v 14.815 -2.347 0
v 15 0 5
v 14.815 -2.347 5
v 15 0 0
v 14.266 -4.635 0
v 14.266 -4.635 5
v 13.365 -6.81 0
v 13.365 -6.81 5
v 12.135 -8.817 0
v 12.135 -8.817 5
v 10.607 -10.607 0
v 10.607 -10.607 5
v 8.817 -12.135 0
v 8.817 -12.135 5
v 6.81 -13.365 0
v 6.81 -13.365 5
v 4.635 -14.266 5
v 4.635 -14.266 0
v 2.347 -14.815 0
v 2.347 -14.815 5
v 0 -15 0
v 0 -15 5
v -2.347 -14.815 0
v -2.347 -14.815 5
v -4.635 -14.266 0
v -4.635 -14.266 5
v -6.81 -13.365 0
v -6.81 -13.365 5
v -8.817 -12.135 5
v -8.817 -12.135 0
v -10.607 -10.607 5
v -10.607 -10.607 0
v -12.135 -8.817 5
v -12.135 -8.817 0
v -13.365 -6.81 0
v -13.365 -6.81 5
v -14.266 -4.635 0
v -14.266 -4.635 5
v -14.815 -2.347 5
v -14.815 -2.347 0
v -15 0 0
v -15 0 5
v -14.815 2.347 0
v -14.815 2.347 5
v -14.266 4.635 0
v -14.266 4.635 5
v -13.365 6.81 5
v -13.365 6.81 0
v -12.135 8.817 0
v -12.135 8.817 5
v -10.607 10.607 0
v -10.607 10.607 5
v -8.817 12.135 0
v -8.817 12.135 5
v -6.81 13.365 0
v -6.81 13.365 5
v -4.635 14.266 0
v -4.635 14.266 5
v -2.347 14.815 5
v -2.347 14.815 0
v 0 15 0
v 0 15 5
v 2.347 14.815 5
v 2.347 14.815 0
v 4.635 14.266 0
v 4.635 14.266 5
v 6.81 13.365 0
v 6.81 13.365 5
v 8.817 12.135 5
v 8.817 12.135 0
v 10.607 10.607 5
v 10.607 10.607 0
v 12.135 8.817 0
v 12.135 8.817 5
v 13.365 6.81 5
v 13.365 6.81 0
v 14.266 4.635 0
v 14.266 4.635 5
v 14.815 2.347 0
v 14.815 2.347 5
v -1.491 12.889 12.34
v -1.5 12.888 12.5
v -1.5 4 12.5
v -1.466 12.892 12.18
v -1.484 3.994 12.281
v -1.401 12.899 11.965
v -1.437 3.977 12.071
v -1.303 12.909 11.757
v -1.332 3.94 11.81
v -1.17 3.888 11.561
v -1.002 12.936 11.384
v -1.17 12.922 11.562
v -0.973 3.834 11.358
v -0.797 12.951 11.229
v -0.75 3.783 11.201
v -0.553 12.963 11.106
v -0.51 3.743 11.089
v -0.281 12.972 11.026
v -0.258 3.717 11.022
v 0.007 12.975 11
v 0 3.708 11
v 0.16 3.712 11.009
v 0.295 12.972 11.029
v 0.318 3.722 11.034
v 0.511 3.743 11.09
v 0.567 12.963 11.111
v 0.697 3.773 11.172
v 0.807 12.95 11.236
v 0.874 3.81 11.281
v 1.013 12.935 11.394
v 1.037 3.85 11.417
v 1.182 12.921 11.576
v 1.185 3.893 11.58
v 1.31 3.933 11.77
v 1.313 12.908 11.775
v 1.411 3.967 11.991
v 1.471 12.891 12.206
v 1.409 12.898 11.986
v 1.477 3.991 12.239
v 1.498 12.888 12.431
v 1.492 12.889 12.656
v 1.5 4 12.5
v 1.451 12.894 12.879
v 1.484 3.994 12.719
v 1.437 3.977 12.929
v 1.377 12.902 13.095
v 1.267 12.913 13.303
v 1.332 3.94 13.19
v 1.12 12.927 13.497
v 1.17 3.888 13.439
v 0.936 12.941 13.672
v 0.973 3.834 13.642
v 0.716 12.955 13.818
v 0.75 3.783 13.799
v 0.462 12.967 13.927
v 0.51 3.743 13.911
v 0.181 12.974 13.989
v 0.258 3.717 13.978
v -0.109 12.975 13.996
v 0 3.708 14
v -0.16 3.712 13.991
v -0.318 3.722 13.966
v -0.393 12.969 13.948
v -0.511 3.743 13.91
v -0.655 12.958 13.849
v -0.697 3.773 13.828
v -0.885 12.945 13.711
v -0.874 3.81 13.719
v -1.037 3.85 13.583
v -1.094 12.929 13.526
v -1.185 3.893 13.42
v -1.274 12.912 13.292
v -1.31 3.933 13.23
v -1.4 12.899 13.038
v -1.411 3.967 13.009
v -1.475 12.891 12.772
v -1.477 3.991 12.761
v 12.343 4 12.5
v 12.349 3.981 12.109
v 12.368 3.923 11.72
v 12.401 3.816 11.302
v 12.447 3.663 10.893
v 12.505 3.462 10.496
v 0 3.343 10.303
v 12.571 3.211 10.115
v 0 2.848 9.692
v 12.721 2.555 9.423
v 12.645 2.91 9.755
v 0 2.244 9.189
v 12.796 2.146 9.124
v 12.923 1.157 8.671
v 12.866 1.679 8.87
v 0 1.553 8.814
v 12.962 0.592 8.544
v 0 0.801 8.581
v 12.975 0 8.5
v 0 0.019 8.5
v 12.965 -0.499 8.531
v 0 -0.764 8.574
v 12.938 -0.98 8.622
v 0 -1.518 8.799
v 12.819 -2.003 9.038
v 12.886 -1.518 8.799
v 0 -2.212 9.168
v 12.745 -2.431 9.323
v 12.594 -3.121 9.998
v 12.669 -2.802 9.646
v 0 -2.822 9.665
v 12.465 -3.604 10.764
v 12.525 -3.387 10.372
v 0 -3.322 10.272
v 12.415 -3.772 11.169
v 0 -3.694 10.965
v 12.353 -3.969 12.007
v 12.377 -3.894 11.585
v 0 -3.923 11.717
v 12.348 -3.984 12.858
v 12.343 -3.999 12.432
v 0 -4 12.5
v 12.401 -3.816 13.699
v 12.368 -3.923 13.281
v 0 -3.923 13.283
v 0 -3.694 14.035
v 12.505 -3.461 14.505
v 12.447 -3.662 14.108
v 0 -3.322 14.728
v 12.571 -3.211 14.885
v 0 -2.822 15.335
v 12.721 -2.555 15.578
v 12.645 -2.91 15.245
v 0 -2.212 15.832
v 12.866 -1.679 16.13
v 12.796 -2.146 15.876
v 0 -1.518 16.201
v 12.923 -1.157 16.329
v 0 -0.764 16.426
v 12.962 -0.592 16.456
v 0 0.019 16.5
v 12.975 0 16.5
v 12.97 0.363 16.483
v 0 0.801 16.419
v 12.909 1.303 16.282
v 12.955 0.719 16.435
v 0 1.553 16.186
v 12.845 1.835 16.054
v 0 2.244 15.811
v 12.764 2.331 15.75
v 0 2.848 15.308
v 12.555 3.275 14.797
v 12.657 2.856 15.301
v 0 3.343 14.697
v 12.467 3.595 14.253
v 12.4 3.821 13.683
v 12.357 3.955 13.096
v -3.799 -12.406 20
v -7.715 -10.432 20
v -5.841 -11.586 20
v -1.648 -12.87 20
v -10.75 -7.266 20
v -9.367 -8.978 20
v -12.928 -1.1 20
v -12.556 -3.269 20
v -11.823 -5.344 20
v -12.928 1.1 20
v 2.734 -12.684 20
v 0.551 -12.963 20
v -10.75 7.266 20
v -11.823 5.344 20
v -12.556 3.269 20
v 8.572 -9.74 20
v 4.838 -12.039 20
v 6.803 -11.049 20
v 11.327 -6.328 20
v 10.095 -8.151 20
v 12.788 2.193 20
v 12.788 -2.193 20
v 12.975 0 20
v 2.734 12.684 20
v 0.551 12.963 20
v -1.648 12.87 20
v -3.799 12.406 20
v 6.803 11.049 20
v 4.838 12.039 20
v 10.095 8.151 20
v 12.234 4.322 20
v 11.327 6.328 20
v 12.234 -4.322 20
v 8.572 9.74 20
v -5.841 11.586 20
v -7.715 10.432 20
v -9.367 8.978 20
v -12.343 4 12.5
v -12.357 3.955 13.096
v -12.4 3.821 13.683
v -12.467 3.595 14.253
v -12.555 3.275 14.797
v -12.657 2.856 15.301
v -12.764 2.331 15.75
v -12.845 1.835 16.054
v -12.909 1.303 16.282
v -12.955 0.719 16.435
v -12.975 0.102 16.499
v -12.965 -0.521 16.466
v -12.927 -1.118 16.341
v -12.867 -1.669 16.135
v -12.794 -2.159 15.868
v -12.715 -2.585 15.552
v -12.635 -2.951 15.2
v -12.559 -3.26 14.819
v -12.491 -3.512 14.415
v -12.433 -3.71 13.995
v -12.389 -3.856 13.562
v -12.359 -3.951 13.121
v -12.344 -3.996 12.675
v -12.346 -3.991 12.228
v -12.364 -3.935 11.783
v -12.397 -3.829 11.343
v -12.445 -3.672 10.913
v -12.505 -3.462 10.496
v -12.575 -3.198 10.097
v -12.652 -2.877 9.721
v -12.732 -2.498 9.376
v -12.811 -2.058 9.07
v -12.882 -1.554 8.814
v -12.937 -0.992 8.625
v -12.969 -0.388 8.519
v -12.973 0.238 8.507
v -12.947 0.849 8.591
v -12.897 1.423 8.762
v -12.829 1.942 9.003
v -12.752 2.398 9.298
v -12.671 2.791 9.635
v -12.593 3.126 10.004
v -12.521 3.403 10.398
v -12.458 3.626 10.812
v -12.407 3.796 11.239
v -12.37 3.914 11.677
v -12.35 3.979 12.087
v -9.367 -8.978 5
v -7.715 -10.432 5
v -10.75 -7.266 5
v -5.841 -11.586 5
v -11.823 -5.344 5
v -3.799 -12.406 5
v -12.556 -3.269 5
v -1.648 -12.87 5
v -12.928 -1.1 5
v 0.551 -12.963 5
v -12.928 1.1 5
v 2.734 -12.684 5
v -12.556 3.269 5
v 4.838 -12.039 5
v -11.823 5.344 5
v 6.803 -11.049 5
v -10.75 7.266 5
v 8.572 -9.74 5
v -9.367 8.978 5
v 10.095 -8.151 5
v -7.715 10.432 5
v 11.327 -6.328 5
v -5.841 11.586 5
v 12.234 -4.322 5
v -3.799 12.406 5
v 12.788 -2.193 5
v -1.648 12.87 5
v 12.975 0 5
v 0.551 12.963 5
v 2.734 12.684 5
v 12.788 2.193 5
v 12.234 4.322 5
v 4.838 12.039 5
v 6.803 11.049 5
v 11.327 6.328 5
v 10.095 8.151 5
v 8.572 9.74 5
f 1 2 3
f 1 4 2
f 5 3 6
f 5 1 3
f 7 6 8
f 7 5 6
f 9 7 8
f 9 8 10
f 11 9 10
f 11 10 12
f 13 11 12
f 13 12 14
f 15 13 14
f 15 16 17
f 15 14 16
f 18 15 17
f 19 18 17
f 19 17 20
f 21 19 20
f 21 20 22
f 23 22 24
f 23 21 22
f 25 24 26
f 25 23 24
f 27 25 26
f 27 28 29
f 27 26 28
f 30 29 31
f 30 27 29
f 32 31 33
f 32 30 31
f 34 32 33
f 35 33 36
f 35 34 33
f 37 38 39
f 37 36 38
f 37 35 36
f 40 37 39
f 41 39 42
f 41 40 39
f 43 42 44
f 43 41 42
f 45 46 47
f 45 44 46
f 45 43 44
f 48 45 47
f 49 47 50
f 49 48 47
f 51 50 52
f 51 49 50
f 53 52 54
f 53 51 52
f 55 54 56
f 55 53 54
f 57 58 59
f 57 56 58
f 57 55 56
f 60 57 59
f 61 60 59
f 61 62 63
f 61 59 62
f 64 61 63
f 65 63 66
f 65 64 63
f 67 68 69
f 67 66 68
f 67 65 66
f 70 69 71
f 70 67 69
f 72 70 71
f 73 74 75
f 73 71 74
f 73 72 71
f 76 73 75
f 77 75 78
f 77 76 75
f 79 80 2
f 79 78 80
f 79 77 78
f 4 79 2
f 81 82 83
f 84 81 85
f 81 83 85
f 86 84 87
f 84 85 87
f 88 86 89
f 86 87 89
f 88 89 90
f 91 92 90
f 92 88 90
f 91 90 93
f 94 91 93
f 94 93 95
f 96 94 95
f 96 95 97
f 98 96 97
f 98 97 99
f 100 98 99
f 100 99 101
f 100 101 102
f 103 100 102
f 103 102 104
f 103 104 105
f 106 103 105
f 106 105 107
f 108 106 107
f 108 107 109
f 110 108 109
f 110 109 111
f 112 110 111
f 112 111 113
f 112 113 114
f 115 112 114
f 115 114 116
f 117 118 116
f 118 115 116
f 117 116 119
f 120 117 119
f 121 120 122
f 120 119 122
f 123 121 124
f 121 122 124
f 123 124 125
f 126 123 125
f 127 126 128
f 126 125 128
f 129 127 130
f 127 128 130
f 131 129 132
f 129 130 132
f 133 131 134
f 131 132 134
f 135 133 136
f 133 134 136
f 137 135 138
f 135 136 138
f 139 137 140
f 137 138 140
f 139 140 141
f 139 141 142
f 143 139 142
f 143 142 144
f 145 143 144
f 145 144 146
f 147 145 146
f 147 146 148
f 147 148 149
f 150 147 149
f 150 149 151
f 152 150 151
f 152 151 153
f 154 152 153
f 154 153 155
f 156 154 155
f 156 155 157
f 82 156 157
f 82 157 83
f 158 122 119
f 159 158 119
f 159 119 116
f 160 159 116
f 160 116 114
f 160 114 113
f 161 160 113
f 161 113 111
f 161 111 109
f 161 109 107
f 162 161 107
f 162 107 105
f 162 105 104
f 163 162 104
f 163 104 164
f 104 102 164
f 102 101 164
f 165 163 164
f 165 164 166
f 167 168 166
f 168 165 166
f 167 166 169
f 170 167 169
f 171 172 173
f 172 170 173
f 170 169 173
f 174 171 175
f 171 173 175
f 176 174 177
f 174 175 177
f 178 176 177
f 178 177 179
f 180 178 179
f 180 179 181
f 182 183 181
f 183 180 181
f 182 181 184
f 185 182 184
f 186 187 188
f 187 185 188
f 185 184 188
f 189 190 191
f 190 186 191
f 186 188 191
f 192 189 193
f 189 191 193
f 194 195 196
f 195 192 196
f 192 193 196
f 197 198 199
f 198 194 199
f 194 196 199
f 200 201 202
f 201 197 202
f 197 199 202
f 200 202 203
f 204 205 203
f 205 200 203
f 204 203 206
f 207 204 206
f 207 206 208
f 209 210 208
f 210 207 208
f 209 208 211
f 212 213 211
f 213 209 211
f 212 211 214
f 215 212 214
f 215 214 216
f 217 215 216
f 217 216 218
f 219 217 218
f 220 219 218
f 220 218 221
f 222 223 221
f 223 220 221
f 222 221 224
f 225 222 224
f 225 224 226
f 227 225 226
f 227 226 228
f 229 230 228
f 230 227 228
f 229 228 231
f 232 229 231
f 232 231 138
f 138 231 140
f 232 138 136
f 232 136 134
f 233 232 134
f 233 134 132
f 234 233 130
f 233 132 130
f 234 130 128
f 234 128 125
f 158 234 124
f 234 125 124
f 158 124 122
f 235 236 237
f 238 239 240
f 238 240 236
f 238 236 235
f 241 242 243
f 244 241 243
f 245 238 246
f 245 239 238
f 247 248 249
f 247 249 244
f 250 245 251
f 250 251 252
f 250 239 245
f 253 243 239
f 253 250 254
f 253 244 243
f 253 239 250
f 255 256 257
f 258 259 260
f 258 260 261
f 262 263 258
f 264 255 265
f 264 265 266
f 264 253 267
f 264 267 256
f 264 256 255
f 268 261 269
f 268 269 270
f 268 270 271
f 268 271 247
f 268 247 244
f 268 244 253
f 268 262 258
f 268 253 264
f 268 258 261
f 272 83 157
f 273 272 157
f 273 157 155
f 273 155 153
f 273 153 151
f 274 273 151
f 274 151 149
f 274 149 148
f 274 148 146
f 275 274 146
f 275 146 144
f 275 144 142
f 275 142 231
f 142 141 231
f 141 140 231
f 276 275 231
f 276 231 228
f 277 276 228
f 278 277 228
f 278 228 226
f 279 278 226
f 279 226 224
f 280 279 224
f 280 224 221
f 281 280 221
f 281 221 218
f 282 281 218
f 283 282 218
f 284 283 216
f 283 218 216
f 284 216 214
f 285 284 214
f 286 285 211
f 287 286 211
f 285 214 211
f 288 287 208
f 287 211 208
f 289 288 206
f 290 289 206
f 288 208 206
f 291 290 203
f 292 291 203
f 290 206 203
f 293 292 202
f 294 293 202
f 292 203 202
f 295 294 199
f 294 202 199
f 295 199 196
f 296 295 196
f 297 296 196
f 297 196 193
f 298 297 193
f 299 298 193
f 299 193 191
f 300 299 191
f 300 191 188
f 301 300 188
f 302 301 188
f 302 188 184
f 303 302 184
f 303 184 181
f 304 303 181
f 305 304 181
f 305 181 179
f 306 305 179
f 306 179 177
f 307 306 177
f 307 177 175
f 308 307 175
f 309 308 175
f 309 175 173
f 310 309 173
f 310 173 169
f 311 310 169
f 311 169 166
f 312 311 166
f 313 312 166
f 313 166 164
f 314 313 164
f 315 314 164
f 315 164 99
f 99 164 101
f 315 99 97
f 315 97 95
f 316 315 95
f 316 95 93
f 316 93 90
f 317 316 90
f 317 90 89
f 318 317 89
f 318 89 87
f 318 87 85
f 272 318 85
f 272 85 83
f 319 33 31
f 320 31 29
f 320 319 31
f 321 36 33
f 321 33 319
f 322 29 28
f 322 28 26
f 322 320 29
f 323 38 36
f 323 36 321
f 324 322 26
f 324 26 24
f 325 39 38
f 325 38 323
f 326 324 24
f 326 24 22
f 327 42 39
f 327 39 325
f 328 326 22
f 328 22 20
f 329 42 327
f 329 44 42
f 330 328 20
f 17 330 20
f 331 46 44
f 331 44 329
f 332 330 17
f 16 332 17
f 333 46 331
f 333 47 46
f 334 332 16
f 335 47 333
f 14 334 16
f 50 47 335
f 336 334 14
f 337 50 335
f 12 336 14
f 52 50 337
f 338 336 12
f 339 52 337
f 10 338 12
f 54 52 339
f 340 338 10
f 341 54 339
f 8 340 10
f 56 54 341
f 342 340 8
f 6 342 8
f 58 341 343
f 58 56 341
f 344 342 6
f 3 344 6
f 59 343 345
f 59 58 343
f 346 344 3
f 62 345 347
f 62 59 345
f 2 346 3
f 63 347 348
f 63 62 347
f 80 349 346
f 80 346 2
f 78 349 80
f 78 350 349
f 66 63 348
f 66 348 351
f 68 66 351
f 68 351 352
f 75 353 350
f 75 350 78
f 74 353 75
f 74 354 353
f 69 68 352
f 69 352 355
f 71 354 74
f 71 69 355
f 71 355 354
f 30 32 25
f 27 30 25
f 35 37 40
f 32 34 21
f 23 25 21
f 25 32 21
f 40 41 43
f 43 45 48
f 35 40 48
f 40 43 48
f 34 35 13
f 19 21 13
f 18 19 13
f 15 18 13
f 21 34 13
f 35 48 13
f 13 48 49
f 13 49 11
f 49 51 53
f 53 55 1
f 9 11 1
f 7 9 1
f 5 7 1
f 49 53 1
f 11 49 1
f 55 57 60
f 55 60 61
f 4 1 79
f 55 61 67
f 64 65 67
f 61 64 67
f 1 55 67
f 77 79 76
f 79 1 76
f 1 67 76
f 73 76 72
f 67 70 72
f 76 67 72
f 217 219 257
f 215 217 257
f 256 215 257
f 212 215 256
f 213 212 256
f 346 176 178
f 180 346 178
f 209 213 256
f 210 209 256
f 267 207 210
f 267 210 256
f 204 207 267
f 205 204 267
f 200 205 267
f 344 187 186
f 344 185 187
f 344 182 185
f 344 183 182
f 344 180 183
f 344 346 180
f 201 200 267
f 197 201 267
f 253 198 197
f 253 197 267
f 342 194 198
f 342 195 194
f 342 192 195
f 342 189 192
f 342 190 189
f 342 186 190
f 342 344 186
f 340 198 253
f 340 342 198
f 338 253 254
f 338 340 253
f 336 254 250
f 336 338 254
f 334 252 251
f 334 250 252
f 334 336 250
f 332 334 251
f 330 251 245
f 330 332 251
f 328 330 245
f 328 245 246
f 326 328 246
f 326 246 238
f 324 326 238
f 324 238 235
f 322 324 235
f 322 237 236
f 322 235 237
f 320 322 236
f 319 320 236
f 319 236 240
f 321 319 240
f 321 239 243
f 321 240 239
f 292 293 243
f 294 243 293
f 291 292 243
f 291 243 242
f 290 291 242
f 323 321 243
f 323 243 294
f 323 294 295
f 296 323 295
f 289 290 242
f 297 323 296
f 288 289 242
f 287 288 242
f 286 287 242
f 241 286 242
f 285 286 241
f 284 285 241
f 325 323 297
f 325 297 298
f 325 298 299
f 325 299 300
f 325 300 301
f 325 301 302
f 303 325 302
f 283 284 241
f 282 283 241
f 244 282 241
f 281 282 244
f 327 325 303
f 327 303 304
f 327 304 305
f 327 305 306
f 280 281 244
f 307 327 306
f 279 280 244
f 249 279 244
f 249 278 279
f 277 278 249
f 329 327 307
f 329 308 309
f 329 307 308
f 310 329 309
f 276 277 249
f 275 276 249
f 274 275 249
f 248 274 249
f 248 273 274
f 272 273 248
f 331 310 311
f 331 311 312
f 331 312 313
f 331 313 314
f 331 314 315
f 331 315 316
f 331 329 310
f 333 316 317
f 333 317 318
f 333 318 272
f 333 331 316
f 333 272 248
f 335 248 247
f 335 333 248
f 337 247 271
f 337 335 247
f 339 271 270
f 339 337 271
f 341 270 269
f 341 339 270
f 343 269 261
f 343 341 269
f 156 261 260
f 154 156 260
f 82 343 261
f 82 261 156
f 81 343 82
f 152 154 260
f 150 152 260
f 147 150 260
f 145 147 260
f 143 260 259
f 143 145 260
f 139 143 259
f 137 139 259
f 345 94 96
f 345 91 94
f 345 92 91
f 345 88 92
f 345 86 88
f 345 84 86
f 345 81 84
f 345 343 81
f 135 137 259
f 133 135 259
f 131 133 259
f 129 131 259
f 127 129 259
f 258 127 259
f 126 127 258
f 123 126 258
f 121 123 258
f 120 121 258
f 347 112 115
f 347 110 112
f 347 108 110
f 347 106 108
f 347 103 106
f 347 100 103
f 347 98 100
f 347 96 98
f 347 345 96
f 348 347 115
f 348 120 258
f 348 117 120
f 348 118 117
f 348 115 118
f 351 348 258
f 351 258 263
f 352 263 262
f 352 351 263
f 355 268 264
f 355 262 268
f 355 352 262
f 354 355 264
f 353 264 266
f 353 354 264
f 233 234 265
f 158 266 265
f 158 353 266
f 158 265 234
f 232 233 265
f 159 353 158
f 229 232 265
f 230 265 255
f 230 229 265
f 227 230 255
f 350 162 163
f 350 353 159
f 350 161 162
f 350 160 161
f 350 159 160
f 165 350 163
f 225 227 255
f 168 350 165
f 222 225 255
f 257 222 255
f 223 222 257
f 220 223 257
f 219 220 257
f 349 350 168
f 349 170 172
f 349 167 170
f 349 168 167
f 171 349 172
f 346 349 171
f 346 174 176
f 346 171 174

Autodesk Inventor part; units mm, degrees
ref_plane "YZ Plane" through (0, 0, 0) normal (1, 0, 0) x (0, 1, 0)
ref_plane "XZ Plane" through (0, 0, 0) normal (0, 1, 0) x (-1, 0, 0)
ref_plane "XY Plane" through (0, 0, 0) normal (0, 0, 1) x (1, 0, 0)
sketch "Szkic1" plane through (0, 0, 0) normal (0, 0, 1) x (1, 0, 0)
  circle A0 centre (0, 0) radius 15
  dimension "d0" = 30
extrude "Wyciągnięcie proste1" add sketch "Szkic1" along normal blind 5
sketch "Szkic2" plane through (0, 0, 5) normal (0, 0, 1) x (1, 0, 0)
  circle A0 centre (0, 0) radius 12.975
  dimension "d3" = 25.95
extrude "Wyciągnięcie proste2" add sketch "Szkic2" along normal blind 15
sketch "Szkic3" plane through (0, 0, 0) normal (0, 1, 0) x (-1, 0, 0)
  circle A0 centre (0, 12.5) radius 1.5
  point P0 (0, 0)
  dimension "d6" = 3
extrude "Wyciągnięcie proste3" cut sketch "Szkic3" along normal blind 20
thread "Gwint1" size "M3x0.5" class "6H" standard "ANSI Metric M Profile" full length
sketch "Szkic4" plane through (0, 0, 0) normal (1, 0, 0) x (0, 1, 0)
  line L0 (0, 14) -> (0, 11) projected
  circle A0 centre (0, 12.5) radius 4
  point P0 (0, 0)
  dimension "d11" = 8
extrude "Wyciągnięcie proste4" cut sketch "Szkic4" along normal mid plane 35
properties part number "koncowka-wala" material "Aluminium 6061"
